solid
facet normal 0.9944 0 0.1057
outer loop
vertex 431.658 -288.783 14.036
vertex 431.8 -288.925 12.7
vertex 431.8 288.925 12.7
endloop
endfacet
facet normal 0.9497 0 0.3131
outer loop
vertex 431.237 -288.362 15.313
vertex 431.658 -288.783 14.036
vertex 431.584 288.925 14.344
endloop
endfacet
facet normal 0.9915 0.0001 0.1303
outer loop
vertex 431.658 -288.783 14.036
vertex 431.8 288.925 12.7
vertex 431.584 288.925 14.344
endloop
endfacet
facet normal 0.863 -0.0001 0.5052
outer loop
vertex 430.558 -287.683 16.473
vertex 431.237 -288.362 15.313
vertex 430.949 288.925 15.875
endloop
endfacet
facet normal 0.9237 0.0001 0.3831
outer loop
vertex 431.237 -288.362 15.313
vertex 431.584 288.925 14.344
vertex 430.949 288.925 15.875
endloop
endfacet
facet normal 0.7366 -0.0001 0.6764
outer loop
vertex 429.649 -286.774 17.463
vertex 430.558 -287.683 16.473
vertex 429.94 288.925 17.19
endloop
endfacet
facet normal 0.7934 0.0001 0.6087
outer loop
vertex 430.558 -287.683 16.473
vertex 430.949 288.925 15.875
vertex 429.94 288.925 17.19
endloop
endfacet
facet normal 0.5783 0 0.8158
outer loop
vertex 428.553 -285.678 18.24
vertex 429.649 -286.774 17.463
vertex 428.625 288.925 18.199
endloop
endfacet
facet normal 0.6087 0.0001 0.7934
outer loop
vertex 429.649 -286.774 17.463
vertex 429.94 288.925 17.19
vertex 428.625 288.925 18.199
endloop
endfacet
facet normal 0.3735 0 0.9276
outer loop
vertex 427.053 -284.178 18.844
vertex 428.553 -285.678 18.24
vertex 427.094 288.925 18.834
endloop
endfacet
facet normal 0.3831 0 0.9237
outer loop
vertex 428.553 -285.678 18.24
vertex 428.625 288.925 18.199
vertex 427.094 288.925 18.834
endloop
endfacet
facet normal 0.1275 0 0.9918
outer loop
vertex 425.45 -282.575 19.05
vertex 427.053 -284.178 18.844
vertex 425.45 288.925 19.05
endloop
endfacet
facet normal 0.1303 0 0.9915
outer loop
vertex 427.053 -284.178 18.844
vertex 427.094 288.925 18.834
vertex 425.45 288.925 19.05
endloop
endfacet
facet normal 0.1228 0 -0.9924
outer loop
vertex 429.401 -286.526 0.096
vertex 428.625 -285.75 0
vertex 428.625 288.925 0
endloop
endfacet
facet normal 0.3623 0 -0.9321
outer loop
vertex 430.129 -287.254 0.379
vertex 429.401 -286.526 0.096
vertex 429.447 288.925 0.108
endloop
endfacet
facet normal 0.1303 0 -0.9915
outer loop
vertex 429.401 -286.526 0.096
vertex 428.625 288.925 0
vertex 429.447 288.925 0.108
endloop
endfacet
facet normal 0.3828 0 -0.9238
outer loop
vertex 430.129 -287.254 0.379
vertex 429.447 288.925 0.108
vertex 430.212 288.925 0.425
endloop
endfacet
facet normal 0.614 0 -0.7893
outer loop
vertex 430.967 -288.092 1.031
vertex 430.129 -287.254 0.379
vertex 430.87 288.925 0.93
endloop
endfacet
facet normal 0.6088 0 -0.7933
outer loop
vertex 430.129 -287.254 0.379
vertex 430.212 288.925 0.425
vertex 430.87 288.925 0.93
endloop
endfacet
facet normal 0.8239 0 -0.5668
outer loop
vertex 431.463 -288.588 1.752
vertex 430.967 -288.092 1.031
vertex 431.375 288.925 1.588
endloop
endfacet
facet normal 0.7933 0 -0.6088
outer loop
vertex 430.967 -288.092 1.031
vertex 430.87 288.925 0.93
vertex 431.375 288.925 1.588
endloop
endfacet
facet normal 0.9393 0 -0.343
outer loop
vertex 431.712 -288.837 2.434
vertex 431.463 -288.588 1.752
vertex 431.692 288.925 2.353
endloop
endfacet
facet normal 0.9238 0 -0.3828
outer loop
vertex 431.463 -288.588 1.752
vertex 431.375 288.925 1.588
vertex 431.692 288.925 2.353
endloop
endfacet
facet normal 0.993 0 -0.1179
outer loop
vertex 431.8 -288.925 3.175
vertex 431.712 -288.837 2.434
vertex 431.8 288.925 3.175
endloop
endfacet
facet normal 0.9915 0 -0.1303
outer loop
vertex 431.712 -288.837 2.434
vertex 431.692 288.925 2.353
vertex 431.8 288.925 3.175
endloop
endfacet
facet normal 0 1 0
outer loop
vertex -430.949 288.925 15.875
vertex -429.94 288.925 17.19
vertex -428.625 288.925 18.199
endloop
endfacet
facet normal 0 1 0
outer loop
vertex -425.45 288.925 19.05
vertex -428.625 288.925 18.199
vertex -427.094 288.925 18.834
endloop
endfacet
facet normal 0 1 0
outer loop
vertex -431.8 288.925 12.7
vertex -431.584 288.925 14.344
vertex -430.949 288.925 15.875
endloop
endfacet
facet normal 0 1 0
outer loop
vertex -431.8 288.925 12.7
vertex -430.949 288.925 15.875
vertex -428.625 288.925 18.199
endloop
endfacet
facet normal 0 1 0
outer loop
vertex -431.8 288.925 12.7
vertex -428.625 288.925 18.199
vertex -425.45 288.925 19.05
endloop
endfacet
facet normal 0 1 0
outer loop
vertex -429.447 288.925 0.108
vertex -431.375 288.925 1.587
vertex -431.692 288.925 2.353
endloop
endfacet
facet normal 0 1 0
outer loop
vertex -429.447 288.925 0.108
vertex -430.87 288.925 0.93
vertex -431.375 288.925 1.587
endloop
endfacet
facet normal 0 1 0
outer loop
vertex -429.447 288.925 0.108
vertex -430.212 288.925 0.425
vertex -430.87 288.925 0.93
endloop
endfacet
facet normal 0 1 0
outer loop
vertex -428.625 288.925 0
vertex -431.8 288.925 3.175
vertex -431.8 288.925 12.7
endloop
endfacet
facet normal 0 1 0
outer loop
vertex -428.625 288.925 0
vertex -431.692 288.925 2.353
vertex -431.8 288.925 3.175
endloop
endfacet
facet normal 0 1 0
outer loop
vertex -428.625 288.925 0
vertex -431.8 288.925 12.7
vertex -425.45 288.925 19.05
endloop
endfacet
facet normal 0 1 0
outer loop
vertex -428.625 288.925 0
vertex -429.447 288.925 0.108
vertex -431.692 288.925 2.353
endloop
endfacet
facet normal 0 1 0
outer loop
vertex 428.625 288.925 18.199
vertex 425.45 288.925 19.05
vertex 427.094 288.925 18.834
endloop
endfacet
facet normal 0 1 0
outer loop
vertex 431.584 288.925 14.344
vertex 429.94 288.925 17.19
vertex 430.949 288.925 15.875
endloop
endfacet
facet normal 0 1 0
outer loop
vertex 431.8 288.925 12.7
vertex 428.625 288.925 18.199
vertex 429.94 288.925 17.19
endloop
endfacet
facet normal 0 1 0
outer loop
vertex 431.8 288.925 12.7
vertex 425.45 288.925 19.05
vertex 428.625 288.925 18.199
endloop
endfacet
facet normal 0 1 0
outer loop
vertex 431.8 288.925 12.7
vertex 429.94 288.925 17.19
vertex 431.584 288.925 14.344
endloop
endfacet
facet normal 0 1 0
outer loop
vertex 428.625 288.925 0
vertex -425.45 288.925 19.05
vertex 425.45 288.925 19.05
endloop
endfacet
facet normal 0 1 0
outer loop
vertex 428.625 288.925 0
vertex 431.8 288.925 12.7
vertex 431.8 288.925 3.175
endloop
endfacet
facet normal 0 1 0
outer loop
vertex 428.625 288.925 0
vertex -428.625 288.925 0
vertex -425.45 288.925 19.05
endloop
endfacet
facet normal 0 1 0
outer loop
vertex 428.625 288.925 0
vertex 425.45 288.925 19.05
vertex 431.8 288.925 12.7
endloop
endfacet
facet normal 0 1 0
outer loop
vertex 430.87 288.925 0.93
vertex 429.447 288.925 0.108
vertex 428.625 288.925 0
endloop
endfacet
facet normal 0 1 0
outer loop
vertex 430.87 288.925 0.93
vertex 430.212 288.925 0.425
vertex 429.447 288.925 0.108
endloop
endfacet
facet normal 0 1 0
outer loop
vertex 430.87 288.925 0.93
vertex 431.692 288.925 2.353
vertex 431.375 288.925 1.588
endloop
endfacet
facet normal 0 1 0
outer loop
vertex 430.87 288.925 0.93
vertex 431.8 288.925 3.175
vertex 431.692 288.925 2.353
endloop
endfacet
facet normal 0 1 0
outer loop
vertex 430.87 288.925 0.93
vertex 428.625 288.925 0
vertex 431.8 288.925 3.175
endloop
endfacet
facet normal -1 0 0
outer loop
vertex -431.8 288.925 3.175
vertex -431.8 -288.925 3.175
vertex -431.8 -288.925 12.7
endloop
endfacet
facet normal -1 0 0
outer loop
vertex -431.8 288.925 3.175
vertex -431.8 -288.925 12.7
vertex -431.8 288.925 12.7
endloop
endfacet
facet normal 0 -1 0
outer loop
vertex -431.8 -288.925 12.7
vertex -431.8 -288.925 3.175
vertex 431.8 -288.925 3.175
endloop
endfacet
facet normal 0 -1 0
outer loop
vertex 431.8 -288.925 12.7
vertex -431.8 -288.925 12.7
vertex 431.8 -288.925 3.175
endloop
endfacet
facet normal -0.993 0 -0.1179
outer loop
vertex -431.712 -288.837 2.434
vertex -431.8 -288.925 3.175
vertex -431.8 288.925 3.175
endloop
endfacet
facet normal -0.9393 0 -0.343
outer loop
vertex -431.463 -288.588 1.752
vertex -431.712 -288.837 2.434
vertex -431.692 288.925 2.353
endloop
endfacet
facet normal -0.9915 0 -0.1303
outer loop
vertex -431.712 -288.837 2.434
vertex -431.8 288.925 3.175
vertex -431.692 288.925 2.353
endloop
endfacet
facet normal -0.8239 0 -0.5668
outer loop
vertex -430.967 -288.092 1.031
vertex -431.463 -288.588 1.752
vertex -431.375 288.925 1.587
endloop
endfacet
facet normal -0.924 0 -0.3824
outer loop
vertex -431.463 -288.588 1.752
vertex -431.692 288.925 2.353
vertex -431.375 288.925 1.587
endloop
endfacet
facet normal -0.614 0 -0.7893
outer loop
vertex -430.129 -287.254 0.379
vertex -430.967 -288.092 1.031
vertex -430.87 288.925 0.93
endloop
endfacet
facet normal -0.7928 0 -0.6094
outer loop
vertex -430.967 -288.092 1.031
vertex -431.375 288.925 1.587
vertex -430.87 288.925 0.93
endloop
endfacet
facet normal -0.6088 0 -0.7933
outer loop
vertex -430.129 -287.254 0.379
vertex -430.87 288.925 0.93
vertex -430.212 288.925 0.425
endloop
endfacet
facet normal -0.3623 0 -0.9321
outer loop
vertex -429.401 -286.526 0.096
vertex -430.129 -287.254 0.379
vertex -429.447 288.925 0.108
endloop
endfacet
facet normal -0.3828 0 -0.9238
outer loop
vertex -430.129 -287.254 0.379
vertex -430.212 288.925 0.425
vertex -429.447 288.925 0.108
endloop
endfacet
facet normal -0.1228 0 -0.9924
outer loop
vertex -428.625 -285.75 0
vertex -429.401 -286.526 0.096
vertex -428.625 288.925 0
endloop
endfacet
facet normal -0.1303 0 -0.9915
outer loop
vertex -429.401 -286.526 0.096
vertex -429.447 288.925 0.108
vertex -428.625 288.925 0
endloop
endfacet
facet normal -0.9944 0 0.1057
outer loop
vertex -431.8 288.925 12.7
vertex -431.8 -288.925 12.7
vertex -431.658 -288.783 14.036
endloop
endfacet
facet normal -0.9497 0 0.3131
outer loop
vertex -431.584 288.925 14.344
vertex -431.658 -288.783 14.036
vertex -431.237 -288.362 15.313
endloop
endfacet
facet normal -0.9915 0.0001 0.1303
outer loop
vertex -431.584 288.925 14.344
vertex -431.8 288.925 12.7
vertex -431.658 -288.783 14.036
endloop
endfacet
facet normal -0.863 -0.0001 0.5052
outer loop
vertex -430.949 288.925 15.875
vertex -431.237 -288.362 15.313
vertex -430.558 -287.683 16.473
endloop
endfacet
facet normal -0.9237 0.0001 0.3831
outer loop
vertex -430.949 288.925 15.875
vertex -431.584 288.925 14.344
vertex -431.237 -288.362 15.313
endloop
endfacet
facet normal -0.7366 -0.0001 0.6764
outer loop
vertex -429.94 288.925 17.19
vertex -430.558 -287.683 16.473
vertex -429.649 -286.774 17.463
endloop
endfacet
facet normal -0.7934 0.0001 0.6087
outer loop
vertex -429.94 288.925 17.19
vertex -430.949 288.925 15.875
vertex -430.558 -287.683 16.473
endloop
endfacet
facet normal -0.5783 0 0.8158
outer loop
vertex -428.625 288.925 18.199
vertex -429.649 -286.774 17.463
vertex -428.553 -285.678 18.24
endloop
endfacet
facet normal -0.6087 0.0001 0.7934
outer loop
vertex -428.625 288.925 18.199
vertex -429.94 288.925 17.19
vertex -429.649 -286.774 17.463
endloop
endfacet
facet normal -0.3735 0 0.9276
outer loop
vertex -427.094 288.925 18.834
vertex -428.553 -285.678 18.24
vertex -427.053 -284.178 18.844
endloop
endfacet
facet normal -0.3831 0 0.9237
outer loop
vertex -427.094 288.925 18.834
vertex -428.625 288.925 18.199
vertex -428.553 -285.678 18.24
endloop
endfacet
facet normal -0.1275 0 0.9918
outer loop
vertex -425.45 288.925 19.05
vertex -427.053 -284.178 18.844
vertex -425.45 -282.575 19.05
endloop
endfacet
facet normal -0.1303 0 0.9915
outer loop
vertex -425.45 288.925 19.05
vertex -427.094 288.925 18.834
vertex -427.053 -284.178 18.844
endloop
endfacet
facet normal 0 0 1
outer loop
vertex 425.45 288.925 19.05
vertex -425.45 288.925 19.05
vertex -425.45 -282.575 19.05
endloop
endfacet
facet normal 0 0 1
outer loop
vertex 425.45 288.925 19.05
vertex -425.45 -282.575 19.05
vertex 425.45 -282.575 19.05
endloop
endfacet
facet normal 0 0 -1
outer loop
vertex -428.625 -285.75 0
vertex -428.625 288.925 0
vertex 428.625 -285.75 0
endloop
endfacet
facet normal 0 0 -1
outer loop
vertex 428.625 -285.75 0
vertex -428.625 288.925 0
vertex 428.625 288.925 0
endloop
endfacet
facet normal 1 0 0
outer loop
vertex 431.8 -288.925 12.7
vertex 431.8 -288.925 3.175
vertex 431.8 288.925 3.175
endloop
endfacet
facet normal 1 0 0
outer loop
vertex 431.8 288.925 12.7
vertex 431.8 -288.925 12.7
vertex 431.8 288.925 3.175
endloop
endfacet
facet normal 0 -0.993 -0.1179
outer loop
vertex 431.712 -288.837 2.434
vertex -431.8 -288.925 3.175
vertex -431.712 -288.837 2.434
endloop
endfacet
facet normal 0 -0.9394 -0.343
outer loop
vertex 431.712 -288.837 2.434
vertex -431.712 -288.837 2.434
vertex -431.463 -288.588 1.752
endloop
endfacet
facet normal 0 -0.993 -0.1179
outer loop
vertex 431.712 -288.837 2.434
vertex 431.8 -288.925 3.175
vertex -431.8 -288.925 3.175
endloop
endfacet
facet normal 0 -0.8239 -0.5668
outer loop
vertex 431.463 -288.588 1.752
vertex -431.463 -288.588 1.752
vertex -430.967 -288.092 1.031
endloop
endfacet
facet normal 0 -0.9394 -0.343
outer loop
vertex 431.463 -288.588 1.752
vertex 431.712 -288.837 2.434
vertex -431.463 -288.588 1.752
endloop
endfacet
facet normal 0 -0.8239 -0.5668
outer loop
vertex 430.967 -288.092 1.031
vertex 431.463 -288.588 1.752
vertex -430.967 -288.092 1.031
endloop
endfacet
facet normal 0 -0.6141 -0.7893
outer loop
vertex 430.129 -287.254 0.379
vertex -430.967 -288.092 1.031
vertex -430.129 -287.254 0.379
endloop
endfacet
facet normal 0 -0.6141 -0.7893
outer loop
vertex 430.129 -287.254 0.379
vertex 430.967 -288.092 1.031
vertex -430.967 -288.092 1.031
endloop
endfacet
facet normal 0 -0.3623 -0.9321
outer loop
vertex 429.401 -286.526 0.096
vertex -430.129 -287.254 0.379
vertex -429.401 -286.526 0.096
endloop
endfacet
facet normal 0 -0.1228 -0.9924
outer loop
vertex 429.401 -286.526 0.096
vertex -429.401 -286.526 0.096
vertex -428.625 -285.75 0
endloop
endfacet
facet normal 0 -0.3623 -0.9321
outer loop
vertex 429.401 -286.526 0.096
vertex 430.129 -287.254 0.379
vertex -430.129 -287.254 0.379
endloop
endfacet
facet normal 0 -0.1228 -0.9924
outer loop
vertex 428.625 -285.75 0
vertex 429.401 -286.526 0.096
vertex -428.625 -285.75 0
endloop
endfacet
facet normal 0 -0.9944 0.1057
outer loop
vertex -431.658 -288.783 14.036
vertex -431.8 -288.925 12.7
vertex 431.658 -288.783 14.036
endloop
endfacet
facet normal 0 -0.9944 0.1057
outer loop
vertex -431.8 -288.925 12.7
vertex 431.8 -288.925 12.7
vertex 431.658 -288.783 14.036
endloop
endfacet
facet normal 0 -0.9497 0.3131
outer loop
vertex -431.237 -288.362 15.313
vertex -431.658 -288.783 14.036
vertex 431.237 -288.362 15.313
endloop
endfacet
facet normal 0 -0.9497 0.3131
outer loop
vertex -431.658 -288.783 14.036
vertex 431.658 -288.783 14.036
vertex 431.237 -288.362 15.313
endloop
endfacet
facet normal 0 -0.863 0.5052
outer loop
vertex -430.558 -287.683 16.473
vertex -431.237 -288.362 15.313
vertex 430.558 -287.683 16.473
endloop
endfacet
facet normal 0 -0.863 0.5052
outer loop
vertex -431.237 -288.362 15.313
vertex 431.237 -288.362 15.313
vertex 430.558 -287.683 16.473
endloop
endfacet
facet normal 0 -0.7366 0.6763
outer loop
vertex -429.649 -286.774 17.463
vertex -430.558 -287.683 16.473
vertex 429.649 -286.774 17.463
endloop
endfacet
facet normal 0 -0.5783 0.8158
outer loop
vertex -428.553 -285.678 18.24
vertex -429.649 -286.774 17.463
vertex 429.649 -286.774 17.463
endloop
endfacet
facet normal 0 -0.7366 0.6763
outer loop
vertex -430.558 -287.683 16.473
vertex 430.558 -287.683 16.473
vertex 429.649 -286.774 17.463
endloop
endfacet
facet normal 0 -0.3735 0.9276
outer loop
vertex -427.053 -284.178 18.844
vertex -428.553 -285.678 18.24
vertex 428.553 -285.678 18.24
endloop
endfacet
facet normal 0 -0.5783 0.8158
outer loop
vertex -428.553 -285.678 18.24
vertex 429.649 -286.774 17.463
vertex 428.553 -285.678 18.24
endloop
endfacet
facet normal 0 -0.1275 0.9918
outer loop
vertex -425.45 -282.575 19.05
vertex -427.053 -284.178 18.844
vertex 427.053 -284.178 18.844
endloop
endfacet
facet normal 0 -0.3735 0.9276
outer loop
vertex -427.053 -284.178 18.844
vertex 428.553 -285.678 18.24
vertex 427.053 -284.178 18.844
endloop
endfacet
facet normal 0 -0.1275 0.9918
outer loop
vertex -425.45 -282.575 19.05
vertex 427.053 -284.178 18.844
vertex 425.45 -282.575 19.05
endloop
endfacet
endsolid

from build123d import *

# Parameters (mm, degrees)
F0_W     = 863.6
F0_H     = 577.85
F1_DEPTH = 19.05
F2_R     = 6.35
F3_R     = 3.175


with BuildPart() as f1:
    # F0 (on Top) → F1 (new body)
    with BuildSketch(Plane.XY):
        Rectangle(F0_W, F0_H)
    extrude(amount=F1_DEPTH)

    # F2
    f2_edges = [f1.edges().sort_by_distance(p)[0] for p in [
        (-431.8, 0, 19.05),
        (0, -288.925, 19.05),
        (431.8, 0, 19.05),
    ]]
    fillet(f2_edges, radius=F2_R)

    # F3
    f3_edges = [f1.edges().sort_by_distance(p)[0] for p in [
        (-431.8, 0, 0),
        (0, -288.925, 0),
        (431.8, 0, 0),
    ]]
    fillet(f3_edges, radius=F3_R)


solid = f1.part
